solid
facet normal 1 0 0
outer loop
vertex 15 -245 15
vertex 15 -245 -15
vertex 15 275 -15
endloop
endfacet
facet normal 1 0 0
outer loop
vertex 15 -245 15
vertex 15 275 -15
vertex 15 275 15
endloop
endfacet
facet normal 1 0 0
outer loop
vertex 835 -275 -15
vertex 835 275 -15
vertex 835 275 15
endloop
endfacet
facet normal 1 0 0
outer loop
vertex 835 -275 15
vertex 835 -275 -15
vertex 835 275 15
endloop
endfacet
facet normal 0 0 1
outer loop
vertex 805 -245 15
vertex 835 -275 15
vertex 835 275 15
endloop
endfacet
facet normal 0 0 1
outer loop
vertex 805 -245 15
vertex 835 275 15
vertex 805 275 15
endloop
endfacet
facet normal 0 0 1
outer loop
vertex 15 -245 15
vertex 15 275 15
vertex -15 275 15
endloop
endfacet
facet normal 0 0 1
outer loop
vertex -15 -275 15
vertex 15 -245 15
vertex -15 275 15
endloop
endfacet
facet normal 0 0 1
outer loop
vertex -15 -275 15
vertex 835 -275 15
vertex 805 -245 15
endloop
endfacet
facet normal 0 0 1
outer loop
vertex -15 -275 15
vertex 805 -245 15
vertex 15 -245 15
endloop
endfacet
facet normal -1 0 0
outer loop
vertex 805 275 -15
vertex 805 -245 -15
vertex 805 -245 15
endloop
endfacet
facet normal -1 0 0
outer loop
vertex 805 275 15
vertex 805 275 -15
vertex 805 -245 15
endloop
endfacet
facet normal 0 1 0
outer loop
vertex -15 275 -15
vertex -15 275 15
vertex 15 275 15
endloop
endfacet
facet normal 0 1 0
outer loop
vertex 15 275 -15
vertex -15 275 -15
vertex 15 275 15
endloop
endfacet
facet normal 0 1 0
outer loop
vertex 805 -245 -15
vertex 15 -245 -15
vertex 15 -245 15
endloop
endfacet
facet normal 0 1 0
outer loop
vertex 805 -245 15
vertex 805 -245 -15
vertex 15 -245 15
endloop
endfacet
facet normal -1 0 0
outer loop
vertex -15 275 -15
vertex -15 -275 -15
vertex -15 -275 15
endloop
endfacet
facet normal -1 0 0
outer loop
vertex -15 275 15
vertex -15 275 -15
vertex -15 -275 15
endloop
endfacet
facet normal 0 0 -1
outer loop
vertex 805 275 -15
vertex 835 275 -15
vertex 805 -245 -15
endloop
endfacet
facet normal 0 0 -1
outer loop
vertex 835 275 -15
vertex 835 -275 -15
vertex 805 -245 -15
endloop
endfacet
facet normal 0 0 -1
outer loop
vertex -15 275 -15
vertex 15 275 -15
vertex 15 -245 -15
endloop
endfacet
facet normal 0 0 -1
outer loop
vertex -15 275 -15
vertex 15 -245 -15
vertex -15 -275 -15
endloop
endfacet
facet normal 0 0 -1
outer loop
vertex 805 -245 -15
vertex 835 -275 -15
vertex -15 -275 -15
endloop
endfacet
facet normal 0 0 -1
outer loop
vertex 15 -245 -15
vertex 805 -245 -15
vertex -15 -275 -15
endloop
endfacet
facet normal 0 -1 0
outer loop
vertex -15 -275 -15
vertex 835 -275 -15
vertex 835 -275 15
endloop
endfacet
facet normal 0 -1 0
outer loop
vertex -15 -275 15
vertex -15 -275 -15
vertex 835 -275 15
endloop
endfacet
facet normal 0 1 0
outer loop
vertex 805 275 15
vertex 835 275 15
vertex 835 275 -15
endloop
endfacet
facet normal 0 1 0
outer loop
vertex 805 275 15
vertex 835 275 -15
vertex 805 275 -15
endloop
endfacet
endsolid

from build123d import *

# Parameters (mm, degrees)
F0_W          = 30
F0_H          = 30
F1_DEPTH      = 275
F2_W          = 30
F2_H          = 30
F3_DEPTH      = 820
F4_W          = 30
F4_H          = 30
F5_DEPTH      = 520
F5_DEPTH_BACK = 25


with BuildPart() as f1:
    # F0 (on Front) → F1 (new body, symmetric)
    with BuildSketch(Plane.XZ):
        Rectangle(F0_W, F0_H)
    extrude(amount=F1_DEPTH, both=True)

    # F2 (on face) → F3 (join)
    with BuildSketch(Plane.YZ.offset(15)):
        with Locations((-260, 0)):
            Rectangle(F2_W, F2_H)
    extrude(amount=F3_DEPTH)

    # F4 (on face) → F5 (join, two sides)
    with BuildSketch(Plane(origin=(0, -245, 0), x_dir=(-1, 0, 0), z_dir=(0, 1, 0))) as f5_sk:
        with Locations((-820, 0)):
            Rectangle(F4_W, F4_H)
    extrude(amount=F5_DEPTH)
    extrude(f5_sk.sketch, amount=-F5_DEPTH_BACK)


solid = f1.part
